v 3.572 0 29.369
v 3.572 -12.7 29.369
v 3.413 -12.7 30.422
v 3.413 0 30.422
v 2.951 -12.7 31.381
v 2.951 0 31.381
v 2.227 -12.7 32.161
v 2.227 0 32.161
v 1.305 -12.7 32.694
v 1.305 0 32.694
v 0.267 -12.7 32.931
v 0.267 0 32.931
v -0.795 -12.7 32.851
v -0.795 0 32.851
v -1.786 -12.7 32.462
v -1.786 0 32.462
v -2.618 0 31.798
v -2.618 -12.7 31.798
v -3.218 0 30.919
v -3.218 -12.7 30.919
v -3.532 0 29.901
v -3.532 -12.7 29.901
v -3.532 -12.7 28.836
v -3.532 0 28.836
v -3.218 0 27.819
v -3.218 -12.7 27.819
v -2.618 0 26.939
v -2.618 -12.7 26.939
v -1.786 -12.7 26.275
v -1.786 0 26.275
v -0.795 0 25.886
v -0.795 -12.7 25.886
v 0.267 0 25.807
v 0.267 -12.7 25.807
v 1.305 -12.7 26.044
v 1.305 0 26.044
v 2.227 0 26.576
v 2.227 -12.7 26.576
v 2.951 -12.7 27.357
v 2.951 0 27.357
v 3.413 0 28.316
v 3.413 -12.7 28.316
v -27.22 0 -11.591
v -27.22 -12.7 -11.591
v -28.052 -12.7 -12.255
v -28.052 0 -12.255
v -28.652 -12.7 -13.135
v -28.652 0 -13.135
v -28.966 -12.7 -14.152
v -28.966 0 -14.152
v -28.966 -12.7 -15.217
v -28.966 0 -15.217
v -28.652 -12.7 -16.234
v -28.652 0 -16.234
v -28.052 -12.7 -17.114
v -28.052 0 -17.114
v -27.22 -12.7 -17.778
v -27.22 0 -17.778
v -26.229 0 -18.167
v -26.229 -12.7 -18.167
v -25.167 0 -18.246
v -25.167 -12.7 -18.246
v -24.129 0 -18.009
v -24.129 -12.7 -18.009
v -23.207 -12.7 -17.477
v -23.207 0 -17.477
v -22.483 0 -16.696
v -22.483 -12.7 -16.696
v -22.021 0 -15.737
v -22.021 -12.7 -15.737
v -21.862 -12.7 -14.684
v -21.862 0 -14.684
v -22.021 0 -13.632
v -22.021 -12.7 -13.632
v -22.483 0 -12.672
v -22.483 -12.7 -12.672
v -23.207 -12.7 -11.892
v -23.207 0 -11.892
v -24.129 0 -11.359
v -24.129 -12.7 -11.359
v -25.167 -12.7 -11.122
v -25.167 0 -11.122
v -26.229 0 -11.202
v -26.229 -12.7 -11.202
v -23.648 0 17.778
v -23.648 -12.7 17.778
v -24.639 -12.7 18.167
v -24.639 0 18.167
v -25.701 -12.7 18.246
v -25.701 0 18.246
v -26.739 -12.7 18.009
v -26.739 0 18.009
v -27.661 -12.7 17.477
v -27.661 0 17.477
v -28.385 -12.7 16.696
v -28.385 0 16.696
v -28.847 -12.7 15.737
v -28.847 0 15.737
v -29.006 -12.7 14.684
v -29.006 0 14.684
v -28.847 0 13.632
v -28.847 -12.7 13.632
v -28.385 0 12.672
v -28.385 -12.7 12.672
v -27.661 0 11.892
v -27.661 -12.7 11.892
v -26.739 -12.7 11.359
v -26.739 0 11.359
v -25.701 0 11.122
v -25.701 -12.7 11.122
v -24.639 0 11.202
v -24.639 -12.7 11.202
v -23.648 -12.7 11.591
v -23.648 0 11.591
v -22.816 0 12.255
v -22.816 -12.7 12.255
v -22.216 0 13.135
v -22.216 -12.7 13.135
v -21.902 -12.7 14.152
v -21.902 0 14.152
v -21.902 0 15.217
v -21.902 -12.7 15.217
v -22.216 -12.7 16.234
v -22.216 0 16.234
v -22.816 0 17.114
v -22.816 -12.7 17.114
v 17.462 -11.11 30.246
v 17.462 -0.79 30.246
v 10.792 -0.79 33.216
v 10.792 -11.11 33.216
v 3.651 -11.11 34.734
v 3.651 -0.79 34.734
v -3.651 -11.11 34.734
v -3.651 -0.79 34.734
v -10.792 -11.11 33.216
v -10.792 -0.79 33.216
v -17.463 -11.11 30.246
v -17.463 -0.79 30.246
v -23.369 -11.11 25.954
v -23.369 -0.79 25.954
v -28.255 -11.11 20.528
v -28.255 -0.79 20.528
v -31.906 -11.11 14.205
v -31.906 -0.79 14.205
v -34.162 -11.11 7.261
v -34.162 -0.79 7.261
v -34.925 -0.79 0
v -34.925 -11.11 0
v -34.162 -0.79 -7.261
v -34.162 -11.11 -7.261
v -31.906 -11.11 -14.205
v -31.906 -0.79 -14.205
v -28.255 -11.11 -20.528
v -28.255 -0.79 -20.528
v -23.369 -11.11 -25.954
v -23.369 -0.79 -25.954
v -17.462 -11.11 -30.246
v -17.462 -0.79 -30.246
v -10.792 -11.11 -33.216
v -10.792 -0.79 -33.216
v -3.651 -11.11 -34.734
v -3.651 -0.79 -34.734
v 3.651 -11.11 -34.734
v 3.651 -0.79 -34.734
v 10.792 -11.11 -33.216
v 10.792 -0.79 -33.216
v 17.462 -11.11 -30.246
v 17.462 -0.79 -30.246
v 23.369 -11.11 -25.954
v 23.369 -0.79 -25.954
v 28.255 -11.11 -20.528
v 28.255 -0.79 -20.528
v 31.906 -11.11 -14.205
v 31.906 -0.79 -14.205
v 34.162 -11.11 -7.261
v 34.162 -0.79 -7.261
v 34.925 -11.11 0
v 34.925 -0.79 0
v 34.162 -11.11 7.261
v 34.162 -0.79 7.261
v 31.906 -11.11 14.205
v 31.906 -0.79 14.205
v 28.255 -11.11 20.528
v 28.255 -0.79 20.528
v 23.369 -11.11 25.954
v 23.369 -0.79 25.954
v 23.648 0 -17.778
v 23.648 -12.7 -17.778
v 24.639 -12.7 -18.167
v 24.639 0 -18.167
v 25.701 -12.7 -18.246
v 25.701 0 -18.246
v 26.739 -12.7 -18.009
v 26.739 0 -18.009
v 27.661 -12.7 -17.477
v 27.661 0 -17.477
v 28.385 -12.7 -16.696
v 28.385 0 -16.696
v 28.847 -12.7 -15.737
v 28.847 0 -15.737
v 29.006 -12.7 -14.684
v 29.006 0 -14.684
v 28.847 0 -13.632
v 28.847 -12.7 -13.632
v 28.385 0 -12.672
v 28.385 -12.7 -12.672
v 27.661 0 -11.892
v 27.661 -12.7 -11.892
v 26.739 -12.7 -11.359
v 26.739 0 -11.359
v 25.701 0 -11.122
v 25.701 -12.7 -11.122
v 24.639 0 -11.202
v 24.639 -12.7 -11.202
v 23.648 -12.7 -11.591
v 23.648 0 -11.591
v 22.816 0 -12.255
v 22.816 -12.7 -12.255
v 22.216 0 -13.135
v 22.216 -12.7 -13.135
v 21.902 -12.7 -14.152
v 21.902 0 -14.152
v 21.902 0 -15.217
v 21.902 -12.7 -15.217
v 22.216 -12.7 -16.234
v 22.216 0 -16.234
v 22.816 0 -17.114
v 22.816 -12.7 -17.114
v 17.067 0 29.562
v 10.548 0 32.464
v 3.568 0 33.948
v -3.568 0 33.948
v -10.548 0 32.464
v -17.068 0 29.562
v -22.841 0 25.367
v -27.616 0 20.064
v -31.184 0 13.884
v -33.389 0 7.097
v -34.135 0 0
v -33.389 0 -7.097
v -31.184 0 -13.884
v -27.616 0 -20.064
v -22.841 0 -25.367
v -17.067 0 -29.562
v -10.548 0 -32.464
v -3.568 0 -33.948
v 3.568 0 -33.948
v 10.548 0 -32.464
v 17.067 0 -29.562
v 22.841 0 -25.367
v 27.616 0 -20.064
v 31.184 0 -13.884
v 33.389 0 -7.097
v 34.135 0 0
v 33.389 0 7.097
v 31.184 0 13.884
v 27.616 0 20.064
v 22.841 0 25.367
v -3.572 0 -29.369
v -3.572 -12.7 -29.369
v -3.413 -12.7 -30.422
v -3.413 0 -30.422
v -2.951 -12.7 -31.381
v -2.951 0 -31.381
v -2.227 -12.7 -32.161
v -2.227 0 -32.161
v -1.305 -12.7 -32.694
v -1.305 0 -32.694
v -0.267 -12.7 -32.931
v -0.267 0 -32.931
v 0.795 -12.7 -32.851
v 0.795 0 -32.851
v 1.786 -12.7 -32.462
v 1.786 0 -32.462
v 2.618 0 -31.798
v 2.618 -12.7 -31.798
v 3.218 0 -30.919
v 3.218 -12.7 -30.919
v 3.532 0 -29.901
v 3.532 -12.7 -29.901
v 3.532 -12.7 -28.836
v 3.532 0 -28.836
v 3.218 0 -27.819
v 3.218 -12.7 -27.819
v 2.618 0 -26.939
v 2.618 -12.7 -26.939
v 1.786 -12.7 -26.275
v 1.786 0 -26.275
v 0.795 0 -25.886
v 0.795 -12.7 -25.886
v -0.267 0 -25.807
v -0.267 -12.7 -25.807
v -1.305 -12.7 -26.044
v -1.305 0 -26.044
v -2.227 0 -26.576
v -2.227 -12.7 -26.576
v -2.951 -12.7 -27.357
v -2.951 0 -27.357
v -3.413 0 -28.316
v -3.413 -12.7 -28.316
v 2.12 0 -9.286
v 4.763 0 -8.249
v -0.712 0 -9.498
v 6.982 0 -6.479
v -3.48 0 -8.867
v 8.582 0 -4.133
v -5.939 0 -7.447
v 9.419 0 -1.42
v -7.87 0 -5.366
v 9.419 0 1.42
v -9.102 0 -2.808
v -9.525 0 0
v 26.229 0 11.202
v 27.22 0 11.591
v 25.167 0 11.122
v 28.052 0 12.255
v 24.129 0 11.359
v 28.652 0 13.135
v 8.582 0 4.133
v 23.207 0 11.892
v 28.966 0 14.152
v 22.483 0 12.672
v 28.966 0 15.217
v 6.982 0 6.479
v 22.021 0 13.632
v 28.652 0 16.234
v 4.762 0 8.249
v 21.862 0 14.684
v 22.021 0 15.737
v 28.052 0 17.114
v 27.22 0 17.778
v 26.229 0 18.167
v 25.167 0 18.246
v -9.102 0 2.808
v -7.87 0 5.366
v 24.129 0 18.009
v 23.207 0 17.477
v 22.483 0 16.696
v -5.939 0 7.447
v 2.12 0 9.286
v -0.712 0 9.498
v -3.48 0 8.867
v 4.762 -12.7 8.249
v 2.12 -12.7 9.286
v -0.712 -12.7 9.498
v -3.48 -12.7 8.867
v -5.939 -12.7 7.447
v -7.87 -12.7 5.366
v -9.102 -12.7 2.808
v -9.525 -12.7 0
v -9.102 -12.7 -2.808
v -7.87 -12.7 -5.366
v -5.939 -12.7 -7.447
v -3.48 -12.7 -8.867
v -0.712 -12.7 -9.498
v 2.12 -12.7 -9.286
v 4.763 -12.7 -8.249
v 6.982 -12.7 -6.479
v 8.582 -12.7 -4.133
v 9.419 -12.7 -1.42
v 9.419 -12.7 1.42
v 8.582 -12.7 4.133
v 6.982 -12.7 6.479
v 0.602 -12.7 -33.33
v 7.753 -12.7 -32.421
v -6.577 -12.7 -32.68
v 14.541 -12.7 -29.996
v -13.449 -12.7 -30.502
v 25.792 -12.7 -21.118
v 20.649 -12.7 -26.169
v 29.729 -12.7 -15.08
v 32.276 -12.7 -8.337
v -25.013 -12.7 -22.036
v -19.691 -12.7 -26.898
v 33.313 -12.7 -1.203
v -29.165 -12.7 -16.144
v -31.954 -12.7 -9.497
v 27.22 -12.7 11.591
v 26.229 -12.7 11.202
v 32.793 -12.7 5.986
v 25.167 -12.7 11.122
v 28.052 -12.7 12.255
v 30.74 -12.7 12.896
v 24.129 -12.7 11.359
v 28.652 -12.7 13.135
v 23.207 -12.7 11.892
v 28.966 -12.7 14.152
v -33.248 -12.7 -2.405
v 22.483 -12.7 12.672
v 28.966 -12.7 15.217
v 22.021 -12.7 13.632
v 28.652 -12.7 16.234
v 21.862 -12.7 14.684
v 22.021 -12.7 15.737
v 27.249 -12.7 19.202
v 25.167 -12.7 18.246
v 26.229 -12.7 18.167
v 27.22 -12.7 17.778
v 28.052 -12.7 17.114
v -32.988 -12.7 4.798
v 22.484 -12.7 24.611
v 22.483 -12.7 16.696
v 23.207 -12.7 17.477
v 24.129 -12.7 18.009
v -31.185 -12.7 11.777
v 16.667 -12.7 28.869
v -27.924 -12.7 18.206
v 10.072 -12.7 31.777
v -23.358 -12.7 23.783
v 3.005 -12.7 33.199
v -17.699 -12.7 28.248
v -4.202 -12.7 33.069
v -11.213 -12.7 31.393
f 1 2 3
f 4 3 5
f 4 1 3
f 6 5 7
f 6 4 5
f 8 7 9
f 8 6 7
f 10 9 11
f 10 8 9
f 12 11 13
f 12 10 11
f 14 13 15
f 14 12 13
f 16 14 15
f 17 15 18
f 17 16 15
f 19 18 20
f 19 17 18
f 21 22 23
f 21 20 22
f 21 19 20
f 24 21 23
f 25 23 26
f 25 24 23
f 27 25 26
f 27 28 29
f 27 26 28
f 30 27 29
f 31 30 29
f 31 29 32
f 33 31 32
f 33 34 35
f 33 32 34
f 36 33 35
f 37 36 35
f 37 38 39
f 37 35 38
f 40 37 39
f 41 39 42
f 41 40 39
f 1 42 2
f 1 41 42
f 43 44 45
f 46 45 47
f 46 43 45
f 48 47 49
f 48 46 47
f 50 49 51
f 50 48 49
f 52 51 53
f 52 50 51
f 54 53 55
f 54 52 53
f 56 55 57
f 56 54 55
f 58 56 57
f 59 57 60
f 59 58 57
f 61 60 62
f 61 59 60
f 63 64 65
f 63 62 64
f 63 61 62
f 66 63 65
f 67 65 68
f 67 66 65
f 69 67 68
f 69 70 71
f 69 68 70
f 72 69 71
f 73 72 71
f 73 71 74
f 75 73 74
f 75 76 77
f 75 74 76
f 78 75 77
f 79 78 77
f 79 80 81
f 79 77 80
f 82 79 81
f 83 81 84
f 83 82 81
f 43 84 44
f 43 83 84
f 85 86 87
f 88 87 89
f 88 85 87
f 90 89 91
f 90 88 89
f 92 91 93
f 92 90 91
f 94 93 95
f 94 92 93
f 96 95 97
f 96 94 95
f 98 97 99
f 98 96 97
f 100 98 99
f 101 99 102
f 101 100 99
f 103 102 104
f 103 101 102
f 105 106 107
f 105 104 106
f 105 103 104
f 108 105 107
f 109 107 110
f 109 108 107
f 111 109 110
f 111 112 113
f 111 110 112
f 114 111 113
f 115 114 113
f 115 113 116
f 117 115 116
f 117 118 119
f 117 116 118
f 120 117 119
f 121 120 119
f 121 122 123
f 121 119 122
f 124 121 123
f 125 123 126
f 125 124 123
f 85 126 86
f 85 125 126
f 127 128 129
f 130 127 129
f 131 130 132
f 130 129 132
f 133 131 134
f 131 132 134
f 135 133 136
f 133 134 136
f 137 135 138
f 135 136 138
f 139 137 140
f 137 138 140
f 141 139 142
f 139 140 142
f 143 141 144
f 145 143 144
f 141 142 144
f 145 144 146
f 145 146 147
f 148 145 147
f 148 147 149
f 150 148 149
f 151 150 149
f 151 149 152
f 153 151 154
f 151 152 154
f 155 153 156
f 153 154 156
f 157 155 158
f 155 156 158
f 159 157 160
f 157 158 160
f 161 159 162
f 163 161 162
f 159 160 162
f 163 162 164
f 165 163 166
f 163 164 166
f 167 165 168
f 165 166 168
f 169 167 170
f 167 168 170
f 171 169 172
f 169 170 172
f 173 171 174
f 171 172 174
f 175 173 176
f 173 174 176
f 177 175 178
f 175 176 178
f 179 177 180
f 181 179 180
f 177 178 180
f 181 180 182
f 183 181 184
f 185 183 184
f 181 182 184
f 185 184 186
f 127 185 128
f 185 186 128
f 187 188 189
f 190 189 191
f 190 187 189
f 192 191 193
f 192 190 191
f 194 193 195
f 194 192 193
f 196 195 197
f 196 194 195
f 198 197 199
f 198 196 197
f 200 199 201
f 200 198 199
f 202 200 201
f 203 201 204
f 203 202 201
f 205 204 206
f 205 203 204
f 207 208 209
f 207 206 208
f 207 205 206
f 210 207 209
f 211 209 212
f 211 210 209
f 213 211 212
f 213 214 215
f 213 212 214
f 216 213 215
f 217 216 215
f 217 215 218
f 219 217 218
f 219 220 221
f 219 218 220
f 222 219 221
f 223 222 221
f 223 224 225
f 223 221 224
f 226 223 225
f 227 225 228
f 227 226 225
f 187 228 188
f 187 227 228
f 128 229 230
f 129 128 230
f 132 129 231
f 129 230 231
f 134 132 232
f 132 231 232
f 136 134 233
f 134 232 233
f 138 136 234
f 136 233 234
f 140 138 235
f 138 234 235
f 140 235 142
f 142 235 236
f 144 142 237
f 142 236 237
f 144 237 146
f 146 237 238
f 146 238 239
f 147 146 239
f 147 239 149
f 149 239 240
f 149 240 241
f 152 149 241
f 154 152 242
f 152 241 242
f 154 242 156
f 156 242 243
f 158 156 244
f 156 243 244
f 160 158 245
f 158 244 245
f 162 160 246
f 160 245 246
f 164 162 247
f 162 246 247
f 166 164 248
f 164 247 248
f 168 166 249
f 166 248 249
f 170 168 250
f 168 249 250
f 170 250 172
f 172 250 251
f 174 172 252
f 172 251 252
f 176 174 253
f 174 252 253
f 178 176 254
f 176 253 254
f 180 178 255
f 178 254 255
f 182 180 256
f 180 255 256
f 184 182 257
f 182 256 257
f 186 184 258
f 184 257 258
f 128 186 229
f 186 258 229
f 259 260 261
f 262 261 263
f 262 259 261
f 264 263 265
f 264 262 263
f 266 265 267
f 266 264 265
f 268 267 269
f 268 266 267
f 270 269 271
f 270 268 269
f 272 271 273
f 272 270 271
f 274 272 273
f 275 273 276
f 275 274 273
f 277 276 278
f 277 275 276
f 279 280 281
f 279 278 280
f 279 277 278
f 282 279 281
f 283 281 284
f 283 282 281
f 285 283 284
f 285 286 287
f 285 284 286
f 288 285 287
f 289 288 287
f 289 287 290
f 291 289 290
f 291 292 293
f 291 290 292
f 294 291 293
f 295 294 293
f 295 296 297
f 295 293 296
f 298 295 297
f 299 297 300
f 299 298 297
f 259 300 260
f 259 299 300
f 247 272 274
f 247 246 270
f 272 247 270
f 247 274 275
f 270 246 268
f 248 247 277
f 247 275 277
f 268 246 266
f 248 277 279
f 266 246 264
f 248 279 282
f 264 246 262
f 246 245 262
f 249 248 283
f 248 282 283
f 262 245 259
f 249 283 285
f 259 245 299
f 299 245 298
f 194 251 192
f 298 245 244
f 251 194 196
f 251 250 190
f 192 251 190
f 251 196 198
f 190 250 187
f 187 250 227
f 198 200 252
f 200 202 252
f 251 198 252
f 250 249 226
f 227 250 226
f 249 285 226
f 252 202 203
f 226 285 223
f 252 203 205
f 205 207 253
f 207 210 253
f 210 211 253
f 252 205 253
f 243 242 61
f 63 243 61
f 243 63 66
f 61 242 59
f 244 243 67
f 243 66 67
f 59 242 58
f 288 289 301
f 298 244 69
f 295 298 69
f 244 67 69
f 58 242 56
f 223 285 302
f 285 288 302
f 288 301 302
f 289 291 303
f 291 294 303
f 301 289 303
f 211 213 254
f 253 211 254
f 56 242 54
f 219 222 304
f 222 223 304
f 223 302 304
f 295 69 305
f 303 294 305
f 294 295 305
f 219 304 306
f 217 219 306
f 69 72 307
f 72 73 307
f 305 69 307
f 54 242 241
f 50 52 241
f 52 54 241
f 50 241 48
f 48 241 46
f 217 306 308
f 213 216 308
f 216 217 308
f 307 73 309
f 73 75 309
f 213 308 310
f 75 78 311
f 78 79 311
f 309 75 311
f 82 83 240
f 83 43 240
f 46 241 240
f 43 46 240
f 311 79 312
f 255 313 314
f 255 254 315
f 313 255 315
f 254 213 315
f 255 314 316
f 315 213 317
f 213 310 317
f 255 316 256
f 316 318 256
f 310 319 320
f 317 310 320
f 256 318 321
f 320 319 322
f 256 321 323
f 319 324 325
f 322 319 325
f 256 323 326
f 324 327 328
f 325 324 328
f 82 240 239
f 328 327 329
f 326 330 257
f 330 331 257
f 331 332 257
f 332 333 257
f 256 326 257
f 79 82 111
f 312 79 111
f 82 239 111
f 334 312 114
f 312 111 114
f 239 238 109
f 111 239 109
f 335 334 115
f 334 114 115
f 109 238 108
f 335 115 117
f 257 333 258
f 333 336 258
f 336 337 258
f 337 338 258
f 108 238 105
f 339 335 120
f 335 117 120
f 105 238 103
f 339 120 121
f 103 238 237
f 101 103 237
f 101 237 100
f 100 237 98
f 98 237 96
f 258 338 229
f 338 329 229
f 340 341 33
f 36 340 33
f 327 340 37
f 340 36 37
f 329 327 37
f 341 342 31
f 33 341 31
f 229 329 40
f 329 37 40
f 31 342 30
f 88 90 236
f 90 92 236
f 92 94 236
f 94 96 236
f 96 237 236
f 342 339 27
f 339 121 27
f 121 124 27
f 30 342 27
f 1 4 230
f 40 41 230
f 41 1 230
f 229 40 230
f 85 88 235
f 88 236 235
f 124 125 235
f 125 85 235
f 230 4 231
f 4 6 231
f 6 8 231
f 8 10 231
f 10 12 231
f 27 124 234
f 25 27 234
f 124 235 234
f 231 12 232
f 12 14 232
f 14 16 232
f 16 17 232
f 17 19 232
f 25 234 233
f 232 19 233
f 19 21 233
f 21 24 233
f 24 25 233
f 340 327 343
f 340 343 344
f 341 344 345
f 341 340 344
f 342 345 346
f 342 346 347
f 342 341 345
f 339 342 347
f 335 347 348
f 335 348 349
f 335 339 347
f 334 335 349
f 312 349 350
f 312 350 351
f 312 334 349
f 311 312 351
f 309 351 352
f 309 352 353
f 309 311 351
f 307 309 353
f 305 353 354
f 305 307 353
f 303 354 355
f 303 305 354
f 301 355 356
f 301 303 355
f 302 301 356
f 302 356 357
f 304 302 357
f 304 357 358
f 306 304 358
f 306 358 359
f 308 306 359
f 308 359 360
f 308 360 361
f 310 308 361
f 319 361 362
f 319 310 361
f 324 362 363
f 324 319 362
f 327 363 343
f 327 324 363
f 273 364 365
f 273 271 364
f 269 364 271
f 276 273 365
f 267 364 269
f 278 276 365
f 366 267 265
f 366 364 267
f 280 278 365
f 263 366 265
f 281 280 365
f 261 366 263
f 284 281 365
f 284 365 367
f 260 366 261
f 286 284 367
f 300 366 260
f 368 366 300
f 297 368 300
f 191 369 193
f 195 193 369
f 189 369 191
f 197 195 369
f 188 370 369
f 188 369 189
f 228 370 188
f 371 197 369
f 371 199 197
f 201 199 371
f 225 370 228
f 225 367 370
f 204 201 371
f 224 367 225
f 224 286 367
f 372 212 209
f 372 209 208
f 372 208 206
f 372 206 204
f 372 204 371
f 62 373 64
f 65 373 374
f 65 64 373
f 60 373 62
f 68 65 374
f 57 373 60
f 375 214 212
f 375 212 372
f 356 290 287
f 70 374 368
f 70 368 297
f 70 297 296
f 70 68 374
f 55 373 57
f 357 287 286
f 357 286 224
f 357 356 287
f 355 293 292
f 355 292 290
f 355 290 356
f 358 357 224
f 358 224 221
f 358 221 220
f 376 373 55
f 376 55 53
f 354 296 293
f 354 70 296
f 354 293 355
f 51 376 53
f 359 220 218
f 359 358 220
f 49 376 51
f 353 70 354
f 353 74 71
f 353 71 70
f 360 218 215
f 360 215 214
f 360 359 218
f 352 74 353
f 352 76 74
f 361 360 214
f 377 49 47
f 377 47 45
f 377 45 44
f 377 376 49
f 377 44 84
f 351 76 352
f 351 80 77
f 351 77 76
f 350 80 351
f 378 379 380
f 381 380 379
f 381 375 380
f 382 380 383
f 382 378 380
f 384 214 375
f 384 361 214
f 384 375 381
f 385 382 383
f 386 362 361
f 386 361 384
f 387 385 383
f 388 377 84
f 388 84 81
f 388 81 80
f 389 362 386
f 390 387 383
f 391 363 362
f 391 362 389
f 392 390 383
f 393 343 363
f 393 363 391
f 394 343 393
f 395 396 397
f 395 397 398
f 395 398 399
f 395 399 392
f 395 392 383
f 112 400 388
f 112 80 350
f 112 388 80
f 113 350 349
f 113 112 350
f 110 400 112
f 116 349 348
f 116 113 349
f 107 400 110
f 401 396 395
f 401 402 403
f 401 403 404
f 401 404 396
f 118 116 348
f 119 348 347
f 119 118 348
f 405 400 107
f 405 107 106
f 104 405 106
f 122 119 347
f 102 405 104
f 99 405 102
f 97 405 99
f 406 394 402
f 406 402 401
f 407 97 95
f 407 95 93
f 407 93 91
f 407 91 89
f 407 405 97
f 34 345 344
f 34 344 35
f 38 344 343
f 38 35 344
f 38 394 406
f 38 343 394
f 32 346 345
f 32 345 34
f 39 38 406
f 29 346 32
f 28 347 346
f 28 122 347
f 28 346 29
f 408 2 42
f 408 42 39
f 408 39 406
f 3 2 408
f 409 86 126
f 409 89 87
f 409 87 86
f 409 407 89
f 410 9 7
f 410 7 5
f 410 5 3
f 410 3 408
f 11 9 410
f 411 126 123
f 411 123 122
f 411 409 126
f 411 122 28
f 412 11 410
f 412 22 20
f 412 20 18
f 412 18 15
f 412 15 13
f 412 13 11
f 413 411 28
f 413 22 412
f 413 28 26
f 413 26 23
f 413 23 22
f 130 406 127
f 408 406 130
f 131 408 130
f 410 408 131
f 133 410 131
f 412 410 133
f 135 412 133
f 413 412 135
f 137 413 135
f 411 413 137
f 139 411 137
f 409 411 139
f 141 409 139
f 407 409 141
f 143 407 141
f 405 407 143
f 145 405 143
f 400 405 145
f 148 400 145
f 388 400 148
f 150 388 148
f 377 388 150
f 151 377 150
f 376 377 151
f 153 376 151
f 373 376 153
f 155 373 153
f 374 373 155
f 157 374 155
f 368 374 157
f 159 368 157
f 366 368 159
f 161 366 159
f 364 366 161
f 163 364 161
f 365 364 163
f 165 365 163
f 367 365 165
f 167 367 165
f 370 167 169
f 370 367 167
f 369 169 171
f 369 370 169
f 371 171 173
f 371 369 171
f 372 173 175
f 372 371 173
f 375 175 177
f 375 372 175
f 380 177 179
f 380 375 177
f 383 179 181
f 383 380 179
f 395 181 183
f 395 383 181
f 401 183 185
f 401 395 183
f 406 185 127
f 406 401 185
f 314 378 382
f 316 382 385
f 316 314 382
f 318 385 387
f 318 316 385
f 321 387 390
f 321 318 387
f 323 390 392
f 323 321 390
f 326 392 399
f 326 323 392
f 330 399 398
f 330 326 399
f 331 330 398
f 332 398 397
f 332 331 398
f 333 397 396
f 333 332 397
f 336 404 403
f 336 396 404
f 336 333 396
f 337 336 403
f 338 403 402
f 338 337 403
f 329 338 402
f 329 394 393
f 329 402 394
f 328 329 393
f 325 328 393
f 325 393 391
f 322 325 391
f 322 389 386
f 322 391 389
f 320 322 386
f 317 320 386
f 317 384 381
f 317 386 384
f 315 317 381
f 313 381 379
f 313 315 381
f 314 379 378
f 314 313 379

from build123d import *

# Parameters (mm, degrees)
SKETCH048_R            = 3.571875
PAD048_DEPTH           = 13
SKETCH047_R            = 34.925
SKETCH047_R_2          = 9.525
PAD047_DEPTH           = 12.7
CUT041_PLACEMENT_ANGLE = 60
CUT042_PLACEMENT_ANGLE = 60
CUT043_PLACEMENT_ANGLE = 60
CUT044_PLACEMENT_ANGLE = 60
CUT045_PLACEMENT_ANGLE = 60
CHAMFER005_SIZE        = 1.59
CHAMFER004_SIZE        = 0.79


with BuildPart() as body049:
    # Sketch048 → Pad048 (new body)
    with BuildSketch(Plane.XZ):
        with Locations((0, 29.36875)):
            Circle(SKETCH048_R)
    extrude(amount=PAD048_DEPTH)


with BuildPart() as chamfer004:
    # Sketch047 → Pad047 (new body)
    with BuildSketch(Plane.XZ):
        Circle(SKETCH047_R)
        Circle(SKETCH047_R_2, mode=Mode.SUBTRACT)
    extrude(amount=PAD047_DEPTH)

    # Cut041: cut Body049
    add(body049.part, mode=Mode.SUBTRACT)


with BuildPart() as chamfer004_1:
    # Cut041 placement: moved
    add(chamfer004.part.rotate(Axis((0, 0, 0), (0, 1, 0)), CUT041_PLACEMENT_ANGLE))

    # Cut042: cut Body049
    add(body049.part, mode=Mode.SUBTRACT)


with BuildPart() as chamfer004_2:
    # Cut042 placement: moved
    add(chamfer004_1.part.rotate(Axis((0, 0, 0), (0, 1, 0)), CUT042_PLACEMENT_ANGLE))

    # Cut043: cut Body049
    add(body049.part, mode=Mode.SUBTRACT)


with BuildPart() as chamfer004_3:
    # Cut043 placement: moved
    add(chamfer004_2.part.rotate(Axis((0, 0, 0), (0, 1, 0)), CUT043_PLACEMENT_ANGLE))

    # Cut044: cut Body049
    add(body049.part, mode=Mode.SUBTRACT)


with BuildPart() as chamfer004_4:
    # Cut044 placement: moved
    add(chamfer004_3.part.rotate(Axis((0, 0, 0), (0, 1, 0)), CUT044_PLACEMENT_ANGLE))

    # Cut045: cut Body049
    add(body049.part, mode=Mode.SUBTRACT)


with BuildPart() as chamfer004_5:
    # Cut045 placement: moved
    add(chamfer004_4.part.rotate(Axis((0, 0, 0), (0, 1, 0)), CUT045_PLACEMENT_ANGLE))

    # Cut046: cut Body049
    add(body049.part, mode=Mode.SUBTRACT)

    # Chamfer005
    chamfer005_edges = [chamfer004_5.edges().sort_by_distance(p)[0] for p in [
        (-17.4625, -12.7, -30.245937),
    ]]
    chamfer(chamfer005_edges, length=CHAMFER005_SIZE)

    # Chamfer004
    chamfer004_edges = [chamfer004_5.edges().sort_by_distance(p)[0] for p in [
        (-17.4625, 0, -30.245937),
    ]]
    chamfer(chamfer004_edges, length=CHAMFER004_SIZE)


solid = chamfer004_5.part
